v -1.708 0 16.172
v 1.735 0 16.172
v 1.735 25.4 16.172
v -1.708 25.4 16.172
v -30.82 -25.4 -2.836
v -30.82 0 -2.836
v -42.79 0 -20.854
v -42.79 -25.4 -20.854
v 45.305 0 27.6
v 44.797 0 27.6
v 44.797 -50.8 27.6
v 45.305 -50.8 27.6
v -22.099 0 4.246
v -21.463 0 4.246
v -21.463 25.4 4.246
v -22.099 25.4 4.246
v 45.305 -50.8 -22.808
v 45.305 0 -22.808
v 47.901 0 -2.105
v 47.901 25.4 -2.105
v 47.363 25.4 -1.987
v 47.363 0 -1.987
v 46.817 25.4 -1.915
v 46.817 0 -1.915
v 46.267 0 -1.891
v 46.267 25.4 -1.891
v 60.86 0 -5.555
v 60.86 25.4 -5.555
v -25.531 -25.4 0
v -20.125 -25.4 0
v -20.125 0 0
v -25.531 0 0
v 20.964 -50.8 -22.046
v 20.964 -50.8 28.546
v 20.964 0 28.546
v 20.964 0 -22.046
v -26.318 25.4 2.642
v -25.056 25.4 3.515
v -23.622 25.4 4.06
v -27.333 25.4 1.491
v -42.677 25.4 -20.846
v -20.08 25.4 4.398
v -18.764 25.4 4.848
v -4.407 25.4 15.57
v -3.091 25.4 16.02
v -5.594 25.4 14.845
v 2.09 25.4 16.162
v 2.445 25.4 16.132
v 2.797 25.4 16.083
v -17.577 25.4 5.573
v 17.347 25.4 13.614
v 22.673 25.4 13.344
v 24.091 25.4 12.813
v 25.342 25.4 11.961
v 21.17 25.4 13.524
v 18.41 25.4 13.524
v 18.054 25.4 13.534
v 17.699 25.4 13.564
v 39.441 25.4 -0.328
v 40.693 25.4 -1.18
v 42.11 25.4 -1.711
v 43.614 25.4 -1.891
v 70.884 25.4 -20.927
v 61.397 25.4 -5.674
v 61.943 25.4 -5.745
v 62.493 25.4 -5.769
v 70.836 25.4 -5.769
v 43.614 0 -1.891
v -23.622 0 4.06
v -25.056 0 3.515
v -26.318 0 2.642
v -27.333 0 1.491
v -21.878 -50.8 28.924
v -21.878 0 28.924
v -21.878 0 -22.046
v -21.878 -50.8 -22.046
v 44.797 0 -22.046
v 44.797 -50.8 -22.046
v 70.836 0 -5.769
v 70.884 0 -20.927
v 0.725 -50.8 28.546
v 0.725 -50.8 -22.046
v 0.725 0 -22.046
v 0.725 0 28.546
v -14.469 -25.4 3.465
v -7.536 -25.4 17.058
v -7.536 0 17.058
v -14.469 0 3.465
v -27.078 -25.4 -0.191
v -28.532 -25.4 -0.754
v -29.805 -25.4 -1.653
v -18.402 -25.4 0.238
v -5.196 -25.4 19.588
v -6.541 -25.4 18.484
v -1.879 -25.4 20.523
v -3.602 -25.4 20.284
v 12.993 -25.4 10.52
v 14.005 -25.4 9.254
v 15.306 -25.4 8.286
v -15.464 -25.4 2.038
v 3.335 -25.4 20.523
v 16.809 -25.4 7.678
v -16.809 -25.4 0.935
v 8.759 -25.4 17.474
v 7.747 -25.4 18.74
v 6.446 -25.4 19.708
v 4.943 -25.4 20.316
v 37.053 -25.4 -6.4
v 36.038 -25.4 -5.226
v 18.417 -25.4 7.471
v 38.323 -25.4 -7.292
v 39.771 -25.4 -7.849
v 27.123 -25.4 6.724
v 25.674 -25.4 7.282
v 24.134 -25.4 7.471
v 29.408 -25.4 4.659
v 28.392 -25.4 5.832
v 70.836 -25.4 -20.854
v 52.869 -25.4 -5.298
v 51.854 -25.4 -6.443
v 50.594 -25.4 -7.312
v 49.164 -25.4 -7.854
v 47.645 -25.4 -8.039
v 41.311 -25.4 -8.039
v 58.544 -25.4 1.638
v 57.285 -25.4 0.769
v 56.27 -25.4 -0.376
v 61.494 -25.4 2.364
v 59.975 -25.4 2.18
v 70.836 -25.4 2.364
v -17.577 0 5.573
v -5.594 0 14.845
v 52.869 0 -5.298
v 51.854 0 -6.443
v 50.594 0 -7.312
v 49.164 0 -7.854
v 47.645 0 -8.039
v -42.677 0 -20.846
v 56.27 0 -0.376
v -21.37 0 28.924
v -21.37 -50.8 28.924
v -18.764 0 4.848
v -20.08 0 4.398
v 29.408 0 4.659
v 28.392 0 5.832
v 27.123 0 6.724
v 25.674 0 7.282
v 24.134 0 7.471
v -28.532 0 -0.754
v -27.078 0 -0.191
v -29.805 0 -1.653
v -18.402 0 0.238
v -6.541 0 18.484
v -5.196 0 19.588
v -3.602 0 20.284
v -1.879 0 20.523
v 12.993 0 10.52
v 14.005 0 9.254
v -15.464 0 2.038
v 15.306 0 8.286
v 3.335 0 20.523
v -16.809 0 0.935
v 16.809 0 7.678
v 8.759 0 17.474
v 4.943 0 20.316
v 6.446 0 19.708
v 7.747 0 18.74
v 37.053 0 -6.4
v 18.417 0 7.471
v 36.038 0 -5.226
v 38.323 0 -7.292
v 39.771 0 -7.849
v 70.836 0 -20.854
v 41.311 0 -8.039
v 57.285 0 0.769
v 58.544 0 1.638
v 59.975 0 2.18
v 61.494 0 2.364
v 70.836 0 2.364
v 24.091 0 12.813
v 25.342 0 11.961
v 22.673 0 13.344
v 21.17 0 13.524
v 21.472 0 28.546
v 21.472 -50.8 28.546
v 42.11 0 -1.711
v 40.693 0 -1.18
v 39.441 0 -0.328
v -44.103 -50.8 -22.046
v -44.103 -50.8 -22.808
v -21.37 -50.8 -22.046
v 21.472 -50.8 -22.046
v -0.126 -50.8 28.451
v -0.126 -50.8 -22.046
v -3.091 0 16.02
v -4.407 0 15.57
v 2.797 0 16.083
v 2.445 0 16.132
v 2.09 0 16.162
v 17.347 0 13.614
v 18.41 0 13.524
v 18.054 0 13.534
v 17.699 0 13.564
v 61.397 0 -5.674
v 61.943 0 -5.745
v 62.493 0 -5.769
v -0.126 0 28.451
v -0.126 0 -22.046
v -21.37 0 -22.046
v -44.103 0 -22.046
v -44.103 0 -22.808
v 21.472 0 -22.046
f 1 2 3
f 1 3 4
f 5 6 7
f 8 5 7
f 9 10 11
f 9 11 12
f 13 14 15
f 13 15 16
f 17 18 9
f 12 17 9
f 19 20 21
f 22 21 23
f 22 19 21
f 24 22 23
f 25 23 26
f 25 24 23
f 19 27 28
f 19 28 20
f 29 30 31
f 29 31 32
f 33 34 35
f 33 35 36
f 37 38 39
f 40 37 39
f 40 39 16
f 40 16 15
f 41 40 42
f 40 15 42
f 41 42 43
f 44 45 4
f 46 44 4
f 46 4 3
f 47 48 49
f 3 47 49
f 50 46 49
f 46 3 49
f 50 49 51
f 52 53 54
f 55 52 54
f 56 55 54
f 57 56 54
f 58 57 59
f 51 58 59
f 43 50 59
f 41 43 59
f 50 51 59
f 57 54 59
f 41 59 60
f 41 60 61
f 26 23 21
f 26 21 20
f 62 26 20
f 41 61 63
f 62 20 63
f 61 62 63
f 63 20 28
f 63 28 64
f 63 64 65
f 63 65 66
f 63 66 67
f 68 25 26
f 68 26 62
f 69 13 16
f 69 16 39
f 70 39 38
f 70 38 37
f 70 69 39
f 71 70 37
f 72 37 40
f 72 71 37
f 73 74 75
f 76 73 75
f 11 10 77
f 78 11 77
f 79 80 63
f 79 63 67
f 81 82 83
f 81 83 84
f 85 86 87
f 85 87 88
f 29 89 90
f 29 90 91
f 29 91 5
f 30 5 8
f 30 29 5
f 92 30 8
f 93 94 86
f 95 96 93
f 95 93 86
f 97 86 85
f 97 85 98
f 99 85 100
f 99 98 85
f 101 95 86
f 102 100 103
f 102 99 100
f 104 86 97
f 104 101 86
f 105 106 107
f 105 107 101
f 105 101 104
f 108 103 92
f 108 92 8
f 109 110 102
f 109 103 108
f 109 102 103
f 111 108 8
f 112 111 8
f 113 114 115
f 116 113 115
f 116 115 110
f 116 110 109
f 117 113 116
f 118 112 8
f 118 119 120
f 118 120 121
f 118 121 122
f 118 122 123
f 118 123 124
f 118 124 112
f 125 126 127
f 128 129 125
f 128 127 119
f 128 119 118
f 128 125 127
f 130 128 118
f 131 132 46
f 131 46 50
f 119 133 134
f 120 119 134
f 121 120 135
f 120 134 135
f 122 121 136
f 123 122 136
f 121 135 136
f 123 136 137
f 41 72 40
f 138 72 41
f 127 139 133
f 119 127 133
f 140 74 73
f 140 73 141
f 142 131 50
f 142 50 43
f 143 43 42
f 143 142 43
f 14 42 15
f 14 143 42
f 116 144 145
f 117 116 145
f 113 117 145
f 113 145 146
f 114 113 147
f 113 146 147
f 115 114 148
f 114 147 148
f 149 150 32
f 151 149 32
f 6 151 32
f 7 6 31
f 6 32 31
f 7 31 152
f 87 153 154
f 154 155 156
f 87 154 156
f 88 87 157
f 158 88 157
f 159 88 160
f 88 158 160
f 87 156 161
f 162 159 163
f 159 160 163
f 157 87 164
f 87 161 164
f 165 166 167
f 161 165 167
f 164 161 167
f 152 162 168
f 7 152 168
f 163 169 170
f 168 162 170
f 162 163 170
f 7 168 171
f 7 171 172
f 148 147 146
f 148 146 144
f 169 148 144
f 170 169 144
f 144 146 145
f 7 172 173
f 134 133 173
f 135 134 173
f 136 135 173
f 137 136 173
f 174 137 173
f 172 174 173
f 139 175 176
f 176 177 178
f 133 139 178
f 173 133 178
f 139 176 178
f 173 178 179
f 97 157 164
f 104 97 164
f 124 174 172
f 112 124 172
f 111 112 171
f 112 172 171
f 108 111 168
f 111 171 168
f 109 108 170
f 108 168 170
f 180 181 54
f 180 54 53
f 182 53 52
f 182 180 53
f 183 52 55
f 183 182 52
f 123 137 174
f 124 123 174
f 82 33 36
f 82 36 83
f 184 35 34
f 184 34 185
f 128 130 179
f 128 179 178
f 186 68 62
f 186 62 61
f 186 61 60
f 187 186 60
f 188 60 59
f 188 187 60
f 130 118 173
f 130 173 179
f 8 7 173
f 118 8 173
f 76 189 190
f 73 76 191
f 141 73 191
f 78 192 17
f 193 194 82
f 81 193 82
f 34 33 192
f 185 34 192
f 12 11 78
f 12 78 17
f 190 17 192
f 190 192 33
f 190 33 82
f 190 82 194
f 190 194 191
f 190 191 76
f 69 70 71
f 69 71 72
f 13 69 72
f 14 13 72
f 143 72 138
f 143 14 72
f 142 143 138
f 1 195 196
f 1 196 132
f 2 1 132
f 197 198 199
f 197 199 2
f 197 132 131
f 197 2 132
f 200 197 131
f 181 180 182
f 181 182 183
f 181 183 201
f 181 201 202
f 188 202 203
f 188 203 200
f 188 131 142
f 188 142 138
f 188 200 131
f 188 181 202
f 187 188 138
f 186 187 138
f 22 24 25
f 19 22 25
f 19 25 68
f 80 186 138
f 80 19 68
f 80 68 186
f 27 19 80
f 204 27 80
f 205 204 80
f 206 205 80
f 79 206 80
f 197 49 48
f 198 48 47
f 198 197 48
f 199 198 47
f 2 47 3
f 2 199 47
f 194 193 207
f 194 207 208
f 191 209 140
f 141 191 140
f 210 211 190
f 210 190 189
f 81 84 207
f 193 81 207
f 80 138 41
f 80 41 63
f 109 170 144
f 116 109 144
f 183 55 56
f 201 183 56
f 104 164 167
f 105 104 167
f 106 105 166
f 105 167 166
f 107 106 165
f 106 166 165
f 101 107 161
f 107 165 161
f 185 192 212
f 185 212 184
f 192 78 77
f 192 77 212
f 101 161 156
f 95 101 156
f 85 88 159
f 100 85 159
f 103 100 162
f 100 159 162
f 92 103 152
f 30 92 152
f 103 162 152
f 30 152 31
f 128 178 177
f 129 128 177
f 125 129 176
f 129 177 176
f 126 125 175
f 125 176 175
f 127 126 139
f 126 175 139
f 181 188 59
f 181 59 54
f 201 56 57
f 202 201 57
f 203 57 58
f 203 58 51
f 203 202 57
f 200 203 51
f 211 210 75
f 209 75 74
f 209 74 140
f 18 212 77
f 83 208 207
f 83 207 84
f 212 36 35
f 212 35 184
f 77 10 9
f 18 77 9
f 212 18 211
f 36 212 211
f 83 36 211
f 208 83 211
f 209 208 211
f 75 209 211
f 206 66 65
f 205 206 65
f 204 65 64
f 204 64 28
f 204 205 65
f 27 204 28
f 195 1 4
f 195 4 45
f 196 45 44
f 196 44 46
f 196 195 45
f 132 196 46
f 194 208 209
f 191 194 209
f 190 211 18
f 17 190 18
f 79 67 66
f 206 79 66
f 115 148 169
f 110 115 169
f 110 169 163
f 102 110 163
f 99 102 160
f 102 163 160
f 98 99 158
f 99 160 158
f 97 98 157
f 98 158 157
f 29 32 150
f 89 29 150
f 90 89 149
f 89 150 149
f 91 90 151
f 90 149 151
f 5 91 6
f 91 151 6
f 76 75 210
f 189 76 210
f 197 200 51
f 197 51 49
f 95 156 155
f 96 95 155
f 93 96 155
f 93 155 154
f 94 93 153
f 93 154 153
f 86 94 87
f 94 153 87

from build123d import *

# Parameters (mm, degrees)
F1_DEPTH = 25.4
F3_DEPTH = 25.4
F4_W     = 22.2249999642
F4_H     = 0.76200068
F4_W_2   = 0.5079992115
F4_W_3   = 21.2441299809
F4_H_2   = 9.0737463906
F4_W_4   = 0.8511701599
F4_H_3   = 20.5226591788
F4_W_5   = 20.2389379265
F4_H_4   = 8.6062769406
F4_W_6   = 0.508
F4_H_5   = 10.0248930976
F4_H_6   = 6.7147873342
F4_W_7   = 23.3247663392
F4_H_7   = 10.4977660812
F4_H_8   = 6.0527641326
F4_H_9   = 5.6744683534
F4_H_10  = 4.7287233174
F5_DEPTH = 50.8


with BuildPart() as f1:
    # F0 (on Front) → F1 (new body)
    with BuildSketch(Plane.XZ):
        with BuildLine():
            Line((-30.819990354, -2.8361052375), (-42.790342193, -20.853979461))
            Line((-42.790342193, -20.853979461), (70.836275816, -20.853979461))
            Line((70.836275816, -20.853979461), (70.836275816, 2.3643618915))
            Line((70.836275816, 2.3643618915), (61.4942277295, 2.3643618915))
            ThreePointArc((61.4942277295, 2.3643618915), (58.5444894383, 1.6376655481), (56.2698894245, -0.3760966869))
            Line((56.2698894245, -0.3760966869), (52.8690463799, -5.2983714337))
            ThreePointArc((52.8690463799, -5.2983714337), (50.594446366, -7.3121336686), (47.6447080748, -8.0388300121))
            Line((47.6447080748, -8.0388300121), (41.311316045, -8.0388300121))
            ThreePointArc((41.311316045, -8.0388300121), (38.3228848586, -7.2916667082), (36.0377122921, -5.2260045141))
            Line((36.0377122921, -5.2260045141), (29.4078207302, 4.6585575856))
            ThreePointArc((29.4078207302, 4.6585575856), (27.1226481637, 6.7242197798), (24.1342169773, 7.4713830836))
            Line((24.1342169773, 7.4713830836), (18.4168425914, 7.4713830836))
            ThreePointArc((18.4168425914, 7.4713830836), (15.3058187841, 8.2856779912), (12.9926818567, 10.5197198173))
            Line((12.9926818567, 10.5197198173), (8.7594460552, 17.4743210481))
            ThreePointArc((8.7594460552, 17.4743210481), (6.4463091278, 19.7083628743), (3.3352853205, 20.5226577818))
            Line((3.3352853205, 20.5226577818), (-1.8794359807, 20.5226577818))
            ThreePointArc((-1.8794359807, 20.5226577818), (-5.1962614115, 19.5875602797), (-7.5362190706, 17.0576716594))
            Line((-7.5362190706, 17.0576716594), (-14.4686196565, 3.4649861225))
            ThreePointArc((-14.4686196565, 3.4649861225), (-16.8085773156, 0.9350975022), (-20.1254027465, 0))
            Line((-20.1254027465, 0), (-22.1528416601, 0))
            Line((-22.1528416601, 0), (-25.5308464159, 0))
            ThreePointArc((-25.5308464159, 0), (-28.5316186713, -0.7537632403), (-30.819990354, -2.8361052375))
        make_face()
    extrude(amount=F1_DEPTH)


with BuildPart() as f3:
    # F2 (on Front) → F3 (new body)
    with BuildSketch(Plane.XZ):
        with BuildLine():
            Line((-42.6766388118, -20.8462458104), (70.8844587207, -20.9271851927))
            Line((70.8844587207, -20.9271851927), (70.836275816, -5.7690422982))
            Line((70.836275816, -5.7690422982), (62.4933730942, -5.7690422982))
            ThreePointArc((62.4933730942, -5.7690422982), (61.669572259, -5.7153787079), (60.8596952382, -5.5552949546))
            Line((60.8596952382, -5.5552949546), (47.9009410616, -2.1052366007))
            ThreePointArc((47.9009410616, -2.1052366007), (47.0910640408, -1.9451528474), (46.2672632057, -1.8914892571))
            Line((46.2672632057, -1.8914892571), (43.6135176722, -1.8914892571))
            ThreePointArc((43.6135176722, -1.8914892571), (41.3856896822, -1.4878564209), (39.4410820167, -0.3282711302))
            Line((39.4410820167, -0.3282711302), (25.342427804, 11.9609304863))
            ThreePointArc((25.342427804, 11.9609304863), (23.3978201385, 13.120515777), (21.1699921485, 13.5241486132))
            Line((21.1699921485, 13.5241486132), (18.4095382194, 13.5241486132))
            ThreePointArc((18.4095382194, 13.5241486132), (17.876462679, 13.5465637289), (17.3471505874, 13.6136508279))
            Line((17.3471505874, 13.6136508279), (2.7972111824, 16.0827317542))
            ThreePointArc((2.7972111824, 16.0827317542), (2.2678990908, 16.1498188533), (1.7348235503, 16.172233969))
            Line((1.7348235503, 16.172233969), (-1.7079213218, 16.172233969))
            ThreePointArc((-1.7079213218, 16.172233969), (-3.7610192582, 15.8311680561), (-5.5935686207, 14.8446084142))
            Line((-5.5935686207, 14.8446084142), (-17.5771749825, 5.5732830285))
            ThreePointArc((-17.5771749825, 5.5732830285), (-19.4097243451, 4.5867233867), (-21.4628222814, 4.2456574738))
            Line((-21.4628222814, 4.2456574738), (-22.0986377263, 4.2456574738))
            ThreePointArc((-22.0986377263, 4.2456574738), (-25.0559805682, 3.5149655554), (-27.332722933, 1.4910506441))
            Line((-27.332722933, 1.4910506441), (-42.6766388118, -20.8462458104))
        make_face()
    extrude(amount=-F3_DEPTH)


with BuildPart() as f5:
    # F4 (on Front) → F5 (new body)
    with BuildSketch(Plane.XZ):
        with Locations((-32.9904966056, -22.4273987114)):
            Rectangle(F4_W, F4_H)
        with Locations((-21.6239970177, -22.4273987114)):
            Rectangle(F4_W_2, F4_H)
        with Locations((-10.7479324215, -22.4273987114)):
            Rectangle(F4_W_3, F4_H)
        with Locations((-21.6239970177, -17.5095251761)):
            Rectangle(F4_W_2, F4_H_2)
        with Locations((0.2997176489, -22.4273987114)):
            Rectangle(F4_W_4, F4_H)
        with Locations((-21.6239970177, -2.7113223914)):
            Rectangle(F4_W_2, F4_H_3)
        with Locations((10.8447716921, -22.4273987114)):
            Rectangle(F4_W_5, F4_H)
        with Locations((0.2997176489, -17.5095251761)):
            Rectangle(F4_W_4, F4_H_2)
        with Locations((-21.6239970177, 11.8531456683)):
            Rectangle(F4_W_2, F4_H_4)
        with Locations((21.2182406553, -22.4273987114)):
            Rectangle(F4_W_6, F4_H)
        with Locations((0.2997176489, -7.960205432)):
            Rectangle(F4_W_4, F4_H_5)
        with Locations((-21.6239970177, 19.5136778057)):
            Rectangle(F4_W_2, F4_H_6)
        with Locations((33.1346238249, -22.4273987114)):
            Rectangle(F4_W_7, F4_H)
        with Locations((21.2182406553, -17.5095251761)):
            Rectangle(F4_W_6, F4_H_2)
        with Locations((0.2997176489, 2.3011241574)):
            Rectangle(F4_W_4, F4_H_7)
        with Locations((-21.6239970177, 25.8974535391)):
            Rectangle(F4_W_2, F4_H_8)
        with Locations((45.0510066003, -22.4273987114)):
            Rectangle(F4_W_2, F4_H)
        with Locations((21.2182406553, -7.960205432)):
            Rectangle(F4_W_6, F4_H_5)
        with Locations((0.2997176489, 11.8531456683)):
            Rectangle(F4_W_4, F4_H_4)
        with Locations((45.0510066003, -17.5095251761)):
            Rectangle(F4_W_2, F4_H_2)
        with Locations((21.2182406553, 2.3011241574)):
            Rectangle(F4_W_6, F4_H_7)
        with Locations((0.2997176489, 19.5136778057)):
            Rectangle(F4_W_4, F4_H_6)
        with Locations((45.0510066003, -7.960205432)):
            Rectangle(F4_W_2, F4_H_5)
        with Locations((21.2182406553, 11.8531456683)):
            Rectangle(F4_W_6, F4_H_4)
        Polygon((-0.1258674311, 28.4509640187), (-0.1258674311, 22.8710714728), (0.7253027288, 22.8710714728), (0.7253027288, 28.5455398262), align=None)
        with Locations((45.0510066003, 2.3011241574)):
            Rectangle(F4_W_2, F4_H_7)
        with Locations((21.2182406553, 19.5136778057)):
            Rectangle(F4_W_6, F4_H_6)
        with Locations((45.0510066003, 11.8531456683)):
            Rectangle(F4_W_2, F4_H_4)
        with Locations((21.2182406553, 25.7083056495)):
            Rectangle(F4_W_6, F4_H_9)
        with Locations((45.0510066003, 19.5136778057)):
            Rectangle(F4_W_2, F4_H_6)
        with Locations((45.0510066003, 25.2354331315)):
            Rectangle(F4_W_2, F4_H_10)
    extrude(amount=F5_DEPTH)


solid = Compound([f1.part, f3.part, f5.part])
